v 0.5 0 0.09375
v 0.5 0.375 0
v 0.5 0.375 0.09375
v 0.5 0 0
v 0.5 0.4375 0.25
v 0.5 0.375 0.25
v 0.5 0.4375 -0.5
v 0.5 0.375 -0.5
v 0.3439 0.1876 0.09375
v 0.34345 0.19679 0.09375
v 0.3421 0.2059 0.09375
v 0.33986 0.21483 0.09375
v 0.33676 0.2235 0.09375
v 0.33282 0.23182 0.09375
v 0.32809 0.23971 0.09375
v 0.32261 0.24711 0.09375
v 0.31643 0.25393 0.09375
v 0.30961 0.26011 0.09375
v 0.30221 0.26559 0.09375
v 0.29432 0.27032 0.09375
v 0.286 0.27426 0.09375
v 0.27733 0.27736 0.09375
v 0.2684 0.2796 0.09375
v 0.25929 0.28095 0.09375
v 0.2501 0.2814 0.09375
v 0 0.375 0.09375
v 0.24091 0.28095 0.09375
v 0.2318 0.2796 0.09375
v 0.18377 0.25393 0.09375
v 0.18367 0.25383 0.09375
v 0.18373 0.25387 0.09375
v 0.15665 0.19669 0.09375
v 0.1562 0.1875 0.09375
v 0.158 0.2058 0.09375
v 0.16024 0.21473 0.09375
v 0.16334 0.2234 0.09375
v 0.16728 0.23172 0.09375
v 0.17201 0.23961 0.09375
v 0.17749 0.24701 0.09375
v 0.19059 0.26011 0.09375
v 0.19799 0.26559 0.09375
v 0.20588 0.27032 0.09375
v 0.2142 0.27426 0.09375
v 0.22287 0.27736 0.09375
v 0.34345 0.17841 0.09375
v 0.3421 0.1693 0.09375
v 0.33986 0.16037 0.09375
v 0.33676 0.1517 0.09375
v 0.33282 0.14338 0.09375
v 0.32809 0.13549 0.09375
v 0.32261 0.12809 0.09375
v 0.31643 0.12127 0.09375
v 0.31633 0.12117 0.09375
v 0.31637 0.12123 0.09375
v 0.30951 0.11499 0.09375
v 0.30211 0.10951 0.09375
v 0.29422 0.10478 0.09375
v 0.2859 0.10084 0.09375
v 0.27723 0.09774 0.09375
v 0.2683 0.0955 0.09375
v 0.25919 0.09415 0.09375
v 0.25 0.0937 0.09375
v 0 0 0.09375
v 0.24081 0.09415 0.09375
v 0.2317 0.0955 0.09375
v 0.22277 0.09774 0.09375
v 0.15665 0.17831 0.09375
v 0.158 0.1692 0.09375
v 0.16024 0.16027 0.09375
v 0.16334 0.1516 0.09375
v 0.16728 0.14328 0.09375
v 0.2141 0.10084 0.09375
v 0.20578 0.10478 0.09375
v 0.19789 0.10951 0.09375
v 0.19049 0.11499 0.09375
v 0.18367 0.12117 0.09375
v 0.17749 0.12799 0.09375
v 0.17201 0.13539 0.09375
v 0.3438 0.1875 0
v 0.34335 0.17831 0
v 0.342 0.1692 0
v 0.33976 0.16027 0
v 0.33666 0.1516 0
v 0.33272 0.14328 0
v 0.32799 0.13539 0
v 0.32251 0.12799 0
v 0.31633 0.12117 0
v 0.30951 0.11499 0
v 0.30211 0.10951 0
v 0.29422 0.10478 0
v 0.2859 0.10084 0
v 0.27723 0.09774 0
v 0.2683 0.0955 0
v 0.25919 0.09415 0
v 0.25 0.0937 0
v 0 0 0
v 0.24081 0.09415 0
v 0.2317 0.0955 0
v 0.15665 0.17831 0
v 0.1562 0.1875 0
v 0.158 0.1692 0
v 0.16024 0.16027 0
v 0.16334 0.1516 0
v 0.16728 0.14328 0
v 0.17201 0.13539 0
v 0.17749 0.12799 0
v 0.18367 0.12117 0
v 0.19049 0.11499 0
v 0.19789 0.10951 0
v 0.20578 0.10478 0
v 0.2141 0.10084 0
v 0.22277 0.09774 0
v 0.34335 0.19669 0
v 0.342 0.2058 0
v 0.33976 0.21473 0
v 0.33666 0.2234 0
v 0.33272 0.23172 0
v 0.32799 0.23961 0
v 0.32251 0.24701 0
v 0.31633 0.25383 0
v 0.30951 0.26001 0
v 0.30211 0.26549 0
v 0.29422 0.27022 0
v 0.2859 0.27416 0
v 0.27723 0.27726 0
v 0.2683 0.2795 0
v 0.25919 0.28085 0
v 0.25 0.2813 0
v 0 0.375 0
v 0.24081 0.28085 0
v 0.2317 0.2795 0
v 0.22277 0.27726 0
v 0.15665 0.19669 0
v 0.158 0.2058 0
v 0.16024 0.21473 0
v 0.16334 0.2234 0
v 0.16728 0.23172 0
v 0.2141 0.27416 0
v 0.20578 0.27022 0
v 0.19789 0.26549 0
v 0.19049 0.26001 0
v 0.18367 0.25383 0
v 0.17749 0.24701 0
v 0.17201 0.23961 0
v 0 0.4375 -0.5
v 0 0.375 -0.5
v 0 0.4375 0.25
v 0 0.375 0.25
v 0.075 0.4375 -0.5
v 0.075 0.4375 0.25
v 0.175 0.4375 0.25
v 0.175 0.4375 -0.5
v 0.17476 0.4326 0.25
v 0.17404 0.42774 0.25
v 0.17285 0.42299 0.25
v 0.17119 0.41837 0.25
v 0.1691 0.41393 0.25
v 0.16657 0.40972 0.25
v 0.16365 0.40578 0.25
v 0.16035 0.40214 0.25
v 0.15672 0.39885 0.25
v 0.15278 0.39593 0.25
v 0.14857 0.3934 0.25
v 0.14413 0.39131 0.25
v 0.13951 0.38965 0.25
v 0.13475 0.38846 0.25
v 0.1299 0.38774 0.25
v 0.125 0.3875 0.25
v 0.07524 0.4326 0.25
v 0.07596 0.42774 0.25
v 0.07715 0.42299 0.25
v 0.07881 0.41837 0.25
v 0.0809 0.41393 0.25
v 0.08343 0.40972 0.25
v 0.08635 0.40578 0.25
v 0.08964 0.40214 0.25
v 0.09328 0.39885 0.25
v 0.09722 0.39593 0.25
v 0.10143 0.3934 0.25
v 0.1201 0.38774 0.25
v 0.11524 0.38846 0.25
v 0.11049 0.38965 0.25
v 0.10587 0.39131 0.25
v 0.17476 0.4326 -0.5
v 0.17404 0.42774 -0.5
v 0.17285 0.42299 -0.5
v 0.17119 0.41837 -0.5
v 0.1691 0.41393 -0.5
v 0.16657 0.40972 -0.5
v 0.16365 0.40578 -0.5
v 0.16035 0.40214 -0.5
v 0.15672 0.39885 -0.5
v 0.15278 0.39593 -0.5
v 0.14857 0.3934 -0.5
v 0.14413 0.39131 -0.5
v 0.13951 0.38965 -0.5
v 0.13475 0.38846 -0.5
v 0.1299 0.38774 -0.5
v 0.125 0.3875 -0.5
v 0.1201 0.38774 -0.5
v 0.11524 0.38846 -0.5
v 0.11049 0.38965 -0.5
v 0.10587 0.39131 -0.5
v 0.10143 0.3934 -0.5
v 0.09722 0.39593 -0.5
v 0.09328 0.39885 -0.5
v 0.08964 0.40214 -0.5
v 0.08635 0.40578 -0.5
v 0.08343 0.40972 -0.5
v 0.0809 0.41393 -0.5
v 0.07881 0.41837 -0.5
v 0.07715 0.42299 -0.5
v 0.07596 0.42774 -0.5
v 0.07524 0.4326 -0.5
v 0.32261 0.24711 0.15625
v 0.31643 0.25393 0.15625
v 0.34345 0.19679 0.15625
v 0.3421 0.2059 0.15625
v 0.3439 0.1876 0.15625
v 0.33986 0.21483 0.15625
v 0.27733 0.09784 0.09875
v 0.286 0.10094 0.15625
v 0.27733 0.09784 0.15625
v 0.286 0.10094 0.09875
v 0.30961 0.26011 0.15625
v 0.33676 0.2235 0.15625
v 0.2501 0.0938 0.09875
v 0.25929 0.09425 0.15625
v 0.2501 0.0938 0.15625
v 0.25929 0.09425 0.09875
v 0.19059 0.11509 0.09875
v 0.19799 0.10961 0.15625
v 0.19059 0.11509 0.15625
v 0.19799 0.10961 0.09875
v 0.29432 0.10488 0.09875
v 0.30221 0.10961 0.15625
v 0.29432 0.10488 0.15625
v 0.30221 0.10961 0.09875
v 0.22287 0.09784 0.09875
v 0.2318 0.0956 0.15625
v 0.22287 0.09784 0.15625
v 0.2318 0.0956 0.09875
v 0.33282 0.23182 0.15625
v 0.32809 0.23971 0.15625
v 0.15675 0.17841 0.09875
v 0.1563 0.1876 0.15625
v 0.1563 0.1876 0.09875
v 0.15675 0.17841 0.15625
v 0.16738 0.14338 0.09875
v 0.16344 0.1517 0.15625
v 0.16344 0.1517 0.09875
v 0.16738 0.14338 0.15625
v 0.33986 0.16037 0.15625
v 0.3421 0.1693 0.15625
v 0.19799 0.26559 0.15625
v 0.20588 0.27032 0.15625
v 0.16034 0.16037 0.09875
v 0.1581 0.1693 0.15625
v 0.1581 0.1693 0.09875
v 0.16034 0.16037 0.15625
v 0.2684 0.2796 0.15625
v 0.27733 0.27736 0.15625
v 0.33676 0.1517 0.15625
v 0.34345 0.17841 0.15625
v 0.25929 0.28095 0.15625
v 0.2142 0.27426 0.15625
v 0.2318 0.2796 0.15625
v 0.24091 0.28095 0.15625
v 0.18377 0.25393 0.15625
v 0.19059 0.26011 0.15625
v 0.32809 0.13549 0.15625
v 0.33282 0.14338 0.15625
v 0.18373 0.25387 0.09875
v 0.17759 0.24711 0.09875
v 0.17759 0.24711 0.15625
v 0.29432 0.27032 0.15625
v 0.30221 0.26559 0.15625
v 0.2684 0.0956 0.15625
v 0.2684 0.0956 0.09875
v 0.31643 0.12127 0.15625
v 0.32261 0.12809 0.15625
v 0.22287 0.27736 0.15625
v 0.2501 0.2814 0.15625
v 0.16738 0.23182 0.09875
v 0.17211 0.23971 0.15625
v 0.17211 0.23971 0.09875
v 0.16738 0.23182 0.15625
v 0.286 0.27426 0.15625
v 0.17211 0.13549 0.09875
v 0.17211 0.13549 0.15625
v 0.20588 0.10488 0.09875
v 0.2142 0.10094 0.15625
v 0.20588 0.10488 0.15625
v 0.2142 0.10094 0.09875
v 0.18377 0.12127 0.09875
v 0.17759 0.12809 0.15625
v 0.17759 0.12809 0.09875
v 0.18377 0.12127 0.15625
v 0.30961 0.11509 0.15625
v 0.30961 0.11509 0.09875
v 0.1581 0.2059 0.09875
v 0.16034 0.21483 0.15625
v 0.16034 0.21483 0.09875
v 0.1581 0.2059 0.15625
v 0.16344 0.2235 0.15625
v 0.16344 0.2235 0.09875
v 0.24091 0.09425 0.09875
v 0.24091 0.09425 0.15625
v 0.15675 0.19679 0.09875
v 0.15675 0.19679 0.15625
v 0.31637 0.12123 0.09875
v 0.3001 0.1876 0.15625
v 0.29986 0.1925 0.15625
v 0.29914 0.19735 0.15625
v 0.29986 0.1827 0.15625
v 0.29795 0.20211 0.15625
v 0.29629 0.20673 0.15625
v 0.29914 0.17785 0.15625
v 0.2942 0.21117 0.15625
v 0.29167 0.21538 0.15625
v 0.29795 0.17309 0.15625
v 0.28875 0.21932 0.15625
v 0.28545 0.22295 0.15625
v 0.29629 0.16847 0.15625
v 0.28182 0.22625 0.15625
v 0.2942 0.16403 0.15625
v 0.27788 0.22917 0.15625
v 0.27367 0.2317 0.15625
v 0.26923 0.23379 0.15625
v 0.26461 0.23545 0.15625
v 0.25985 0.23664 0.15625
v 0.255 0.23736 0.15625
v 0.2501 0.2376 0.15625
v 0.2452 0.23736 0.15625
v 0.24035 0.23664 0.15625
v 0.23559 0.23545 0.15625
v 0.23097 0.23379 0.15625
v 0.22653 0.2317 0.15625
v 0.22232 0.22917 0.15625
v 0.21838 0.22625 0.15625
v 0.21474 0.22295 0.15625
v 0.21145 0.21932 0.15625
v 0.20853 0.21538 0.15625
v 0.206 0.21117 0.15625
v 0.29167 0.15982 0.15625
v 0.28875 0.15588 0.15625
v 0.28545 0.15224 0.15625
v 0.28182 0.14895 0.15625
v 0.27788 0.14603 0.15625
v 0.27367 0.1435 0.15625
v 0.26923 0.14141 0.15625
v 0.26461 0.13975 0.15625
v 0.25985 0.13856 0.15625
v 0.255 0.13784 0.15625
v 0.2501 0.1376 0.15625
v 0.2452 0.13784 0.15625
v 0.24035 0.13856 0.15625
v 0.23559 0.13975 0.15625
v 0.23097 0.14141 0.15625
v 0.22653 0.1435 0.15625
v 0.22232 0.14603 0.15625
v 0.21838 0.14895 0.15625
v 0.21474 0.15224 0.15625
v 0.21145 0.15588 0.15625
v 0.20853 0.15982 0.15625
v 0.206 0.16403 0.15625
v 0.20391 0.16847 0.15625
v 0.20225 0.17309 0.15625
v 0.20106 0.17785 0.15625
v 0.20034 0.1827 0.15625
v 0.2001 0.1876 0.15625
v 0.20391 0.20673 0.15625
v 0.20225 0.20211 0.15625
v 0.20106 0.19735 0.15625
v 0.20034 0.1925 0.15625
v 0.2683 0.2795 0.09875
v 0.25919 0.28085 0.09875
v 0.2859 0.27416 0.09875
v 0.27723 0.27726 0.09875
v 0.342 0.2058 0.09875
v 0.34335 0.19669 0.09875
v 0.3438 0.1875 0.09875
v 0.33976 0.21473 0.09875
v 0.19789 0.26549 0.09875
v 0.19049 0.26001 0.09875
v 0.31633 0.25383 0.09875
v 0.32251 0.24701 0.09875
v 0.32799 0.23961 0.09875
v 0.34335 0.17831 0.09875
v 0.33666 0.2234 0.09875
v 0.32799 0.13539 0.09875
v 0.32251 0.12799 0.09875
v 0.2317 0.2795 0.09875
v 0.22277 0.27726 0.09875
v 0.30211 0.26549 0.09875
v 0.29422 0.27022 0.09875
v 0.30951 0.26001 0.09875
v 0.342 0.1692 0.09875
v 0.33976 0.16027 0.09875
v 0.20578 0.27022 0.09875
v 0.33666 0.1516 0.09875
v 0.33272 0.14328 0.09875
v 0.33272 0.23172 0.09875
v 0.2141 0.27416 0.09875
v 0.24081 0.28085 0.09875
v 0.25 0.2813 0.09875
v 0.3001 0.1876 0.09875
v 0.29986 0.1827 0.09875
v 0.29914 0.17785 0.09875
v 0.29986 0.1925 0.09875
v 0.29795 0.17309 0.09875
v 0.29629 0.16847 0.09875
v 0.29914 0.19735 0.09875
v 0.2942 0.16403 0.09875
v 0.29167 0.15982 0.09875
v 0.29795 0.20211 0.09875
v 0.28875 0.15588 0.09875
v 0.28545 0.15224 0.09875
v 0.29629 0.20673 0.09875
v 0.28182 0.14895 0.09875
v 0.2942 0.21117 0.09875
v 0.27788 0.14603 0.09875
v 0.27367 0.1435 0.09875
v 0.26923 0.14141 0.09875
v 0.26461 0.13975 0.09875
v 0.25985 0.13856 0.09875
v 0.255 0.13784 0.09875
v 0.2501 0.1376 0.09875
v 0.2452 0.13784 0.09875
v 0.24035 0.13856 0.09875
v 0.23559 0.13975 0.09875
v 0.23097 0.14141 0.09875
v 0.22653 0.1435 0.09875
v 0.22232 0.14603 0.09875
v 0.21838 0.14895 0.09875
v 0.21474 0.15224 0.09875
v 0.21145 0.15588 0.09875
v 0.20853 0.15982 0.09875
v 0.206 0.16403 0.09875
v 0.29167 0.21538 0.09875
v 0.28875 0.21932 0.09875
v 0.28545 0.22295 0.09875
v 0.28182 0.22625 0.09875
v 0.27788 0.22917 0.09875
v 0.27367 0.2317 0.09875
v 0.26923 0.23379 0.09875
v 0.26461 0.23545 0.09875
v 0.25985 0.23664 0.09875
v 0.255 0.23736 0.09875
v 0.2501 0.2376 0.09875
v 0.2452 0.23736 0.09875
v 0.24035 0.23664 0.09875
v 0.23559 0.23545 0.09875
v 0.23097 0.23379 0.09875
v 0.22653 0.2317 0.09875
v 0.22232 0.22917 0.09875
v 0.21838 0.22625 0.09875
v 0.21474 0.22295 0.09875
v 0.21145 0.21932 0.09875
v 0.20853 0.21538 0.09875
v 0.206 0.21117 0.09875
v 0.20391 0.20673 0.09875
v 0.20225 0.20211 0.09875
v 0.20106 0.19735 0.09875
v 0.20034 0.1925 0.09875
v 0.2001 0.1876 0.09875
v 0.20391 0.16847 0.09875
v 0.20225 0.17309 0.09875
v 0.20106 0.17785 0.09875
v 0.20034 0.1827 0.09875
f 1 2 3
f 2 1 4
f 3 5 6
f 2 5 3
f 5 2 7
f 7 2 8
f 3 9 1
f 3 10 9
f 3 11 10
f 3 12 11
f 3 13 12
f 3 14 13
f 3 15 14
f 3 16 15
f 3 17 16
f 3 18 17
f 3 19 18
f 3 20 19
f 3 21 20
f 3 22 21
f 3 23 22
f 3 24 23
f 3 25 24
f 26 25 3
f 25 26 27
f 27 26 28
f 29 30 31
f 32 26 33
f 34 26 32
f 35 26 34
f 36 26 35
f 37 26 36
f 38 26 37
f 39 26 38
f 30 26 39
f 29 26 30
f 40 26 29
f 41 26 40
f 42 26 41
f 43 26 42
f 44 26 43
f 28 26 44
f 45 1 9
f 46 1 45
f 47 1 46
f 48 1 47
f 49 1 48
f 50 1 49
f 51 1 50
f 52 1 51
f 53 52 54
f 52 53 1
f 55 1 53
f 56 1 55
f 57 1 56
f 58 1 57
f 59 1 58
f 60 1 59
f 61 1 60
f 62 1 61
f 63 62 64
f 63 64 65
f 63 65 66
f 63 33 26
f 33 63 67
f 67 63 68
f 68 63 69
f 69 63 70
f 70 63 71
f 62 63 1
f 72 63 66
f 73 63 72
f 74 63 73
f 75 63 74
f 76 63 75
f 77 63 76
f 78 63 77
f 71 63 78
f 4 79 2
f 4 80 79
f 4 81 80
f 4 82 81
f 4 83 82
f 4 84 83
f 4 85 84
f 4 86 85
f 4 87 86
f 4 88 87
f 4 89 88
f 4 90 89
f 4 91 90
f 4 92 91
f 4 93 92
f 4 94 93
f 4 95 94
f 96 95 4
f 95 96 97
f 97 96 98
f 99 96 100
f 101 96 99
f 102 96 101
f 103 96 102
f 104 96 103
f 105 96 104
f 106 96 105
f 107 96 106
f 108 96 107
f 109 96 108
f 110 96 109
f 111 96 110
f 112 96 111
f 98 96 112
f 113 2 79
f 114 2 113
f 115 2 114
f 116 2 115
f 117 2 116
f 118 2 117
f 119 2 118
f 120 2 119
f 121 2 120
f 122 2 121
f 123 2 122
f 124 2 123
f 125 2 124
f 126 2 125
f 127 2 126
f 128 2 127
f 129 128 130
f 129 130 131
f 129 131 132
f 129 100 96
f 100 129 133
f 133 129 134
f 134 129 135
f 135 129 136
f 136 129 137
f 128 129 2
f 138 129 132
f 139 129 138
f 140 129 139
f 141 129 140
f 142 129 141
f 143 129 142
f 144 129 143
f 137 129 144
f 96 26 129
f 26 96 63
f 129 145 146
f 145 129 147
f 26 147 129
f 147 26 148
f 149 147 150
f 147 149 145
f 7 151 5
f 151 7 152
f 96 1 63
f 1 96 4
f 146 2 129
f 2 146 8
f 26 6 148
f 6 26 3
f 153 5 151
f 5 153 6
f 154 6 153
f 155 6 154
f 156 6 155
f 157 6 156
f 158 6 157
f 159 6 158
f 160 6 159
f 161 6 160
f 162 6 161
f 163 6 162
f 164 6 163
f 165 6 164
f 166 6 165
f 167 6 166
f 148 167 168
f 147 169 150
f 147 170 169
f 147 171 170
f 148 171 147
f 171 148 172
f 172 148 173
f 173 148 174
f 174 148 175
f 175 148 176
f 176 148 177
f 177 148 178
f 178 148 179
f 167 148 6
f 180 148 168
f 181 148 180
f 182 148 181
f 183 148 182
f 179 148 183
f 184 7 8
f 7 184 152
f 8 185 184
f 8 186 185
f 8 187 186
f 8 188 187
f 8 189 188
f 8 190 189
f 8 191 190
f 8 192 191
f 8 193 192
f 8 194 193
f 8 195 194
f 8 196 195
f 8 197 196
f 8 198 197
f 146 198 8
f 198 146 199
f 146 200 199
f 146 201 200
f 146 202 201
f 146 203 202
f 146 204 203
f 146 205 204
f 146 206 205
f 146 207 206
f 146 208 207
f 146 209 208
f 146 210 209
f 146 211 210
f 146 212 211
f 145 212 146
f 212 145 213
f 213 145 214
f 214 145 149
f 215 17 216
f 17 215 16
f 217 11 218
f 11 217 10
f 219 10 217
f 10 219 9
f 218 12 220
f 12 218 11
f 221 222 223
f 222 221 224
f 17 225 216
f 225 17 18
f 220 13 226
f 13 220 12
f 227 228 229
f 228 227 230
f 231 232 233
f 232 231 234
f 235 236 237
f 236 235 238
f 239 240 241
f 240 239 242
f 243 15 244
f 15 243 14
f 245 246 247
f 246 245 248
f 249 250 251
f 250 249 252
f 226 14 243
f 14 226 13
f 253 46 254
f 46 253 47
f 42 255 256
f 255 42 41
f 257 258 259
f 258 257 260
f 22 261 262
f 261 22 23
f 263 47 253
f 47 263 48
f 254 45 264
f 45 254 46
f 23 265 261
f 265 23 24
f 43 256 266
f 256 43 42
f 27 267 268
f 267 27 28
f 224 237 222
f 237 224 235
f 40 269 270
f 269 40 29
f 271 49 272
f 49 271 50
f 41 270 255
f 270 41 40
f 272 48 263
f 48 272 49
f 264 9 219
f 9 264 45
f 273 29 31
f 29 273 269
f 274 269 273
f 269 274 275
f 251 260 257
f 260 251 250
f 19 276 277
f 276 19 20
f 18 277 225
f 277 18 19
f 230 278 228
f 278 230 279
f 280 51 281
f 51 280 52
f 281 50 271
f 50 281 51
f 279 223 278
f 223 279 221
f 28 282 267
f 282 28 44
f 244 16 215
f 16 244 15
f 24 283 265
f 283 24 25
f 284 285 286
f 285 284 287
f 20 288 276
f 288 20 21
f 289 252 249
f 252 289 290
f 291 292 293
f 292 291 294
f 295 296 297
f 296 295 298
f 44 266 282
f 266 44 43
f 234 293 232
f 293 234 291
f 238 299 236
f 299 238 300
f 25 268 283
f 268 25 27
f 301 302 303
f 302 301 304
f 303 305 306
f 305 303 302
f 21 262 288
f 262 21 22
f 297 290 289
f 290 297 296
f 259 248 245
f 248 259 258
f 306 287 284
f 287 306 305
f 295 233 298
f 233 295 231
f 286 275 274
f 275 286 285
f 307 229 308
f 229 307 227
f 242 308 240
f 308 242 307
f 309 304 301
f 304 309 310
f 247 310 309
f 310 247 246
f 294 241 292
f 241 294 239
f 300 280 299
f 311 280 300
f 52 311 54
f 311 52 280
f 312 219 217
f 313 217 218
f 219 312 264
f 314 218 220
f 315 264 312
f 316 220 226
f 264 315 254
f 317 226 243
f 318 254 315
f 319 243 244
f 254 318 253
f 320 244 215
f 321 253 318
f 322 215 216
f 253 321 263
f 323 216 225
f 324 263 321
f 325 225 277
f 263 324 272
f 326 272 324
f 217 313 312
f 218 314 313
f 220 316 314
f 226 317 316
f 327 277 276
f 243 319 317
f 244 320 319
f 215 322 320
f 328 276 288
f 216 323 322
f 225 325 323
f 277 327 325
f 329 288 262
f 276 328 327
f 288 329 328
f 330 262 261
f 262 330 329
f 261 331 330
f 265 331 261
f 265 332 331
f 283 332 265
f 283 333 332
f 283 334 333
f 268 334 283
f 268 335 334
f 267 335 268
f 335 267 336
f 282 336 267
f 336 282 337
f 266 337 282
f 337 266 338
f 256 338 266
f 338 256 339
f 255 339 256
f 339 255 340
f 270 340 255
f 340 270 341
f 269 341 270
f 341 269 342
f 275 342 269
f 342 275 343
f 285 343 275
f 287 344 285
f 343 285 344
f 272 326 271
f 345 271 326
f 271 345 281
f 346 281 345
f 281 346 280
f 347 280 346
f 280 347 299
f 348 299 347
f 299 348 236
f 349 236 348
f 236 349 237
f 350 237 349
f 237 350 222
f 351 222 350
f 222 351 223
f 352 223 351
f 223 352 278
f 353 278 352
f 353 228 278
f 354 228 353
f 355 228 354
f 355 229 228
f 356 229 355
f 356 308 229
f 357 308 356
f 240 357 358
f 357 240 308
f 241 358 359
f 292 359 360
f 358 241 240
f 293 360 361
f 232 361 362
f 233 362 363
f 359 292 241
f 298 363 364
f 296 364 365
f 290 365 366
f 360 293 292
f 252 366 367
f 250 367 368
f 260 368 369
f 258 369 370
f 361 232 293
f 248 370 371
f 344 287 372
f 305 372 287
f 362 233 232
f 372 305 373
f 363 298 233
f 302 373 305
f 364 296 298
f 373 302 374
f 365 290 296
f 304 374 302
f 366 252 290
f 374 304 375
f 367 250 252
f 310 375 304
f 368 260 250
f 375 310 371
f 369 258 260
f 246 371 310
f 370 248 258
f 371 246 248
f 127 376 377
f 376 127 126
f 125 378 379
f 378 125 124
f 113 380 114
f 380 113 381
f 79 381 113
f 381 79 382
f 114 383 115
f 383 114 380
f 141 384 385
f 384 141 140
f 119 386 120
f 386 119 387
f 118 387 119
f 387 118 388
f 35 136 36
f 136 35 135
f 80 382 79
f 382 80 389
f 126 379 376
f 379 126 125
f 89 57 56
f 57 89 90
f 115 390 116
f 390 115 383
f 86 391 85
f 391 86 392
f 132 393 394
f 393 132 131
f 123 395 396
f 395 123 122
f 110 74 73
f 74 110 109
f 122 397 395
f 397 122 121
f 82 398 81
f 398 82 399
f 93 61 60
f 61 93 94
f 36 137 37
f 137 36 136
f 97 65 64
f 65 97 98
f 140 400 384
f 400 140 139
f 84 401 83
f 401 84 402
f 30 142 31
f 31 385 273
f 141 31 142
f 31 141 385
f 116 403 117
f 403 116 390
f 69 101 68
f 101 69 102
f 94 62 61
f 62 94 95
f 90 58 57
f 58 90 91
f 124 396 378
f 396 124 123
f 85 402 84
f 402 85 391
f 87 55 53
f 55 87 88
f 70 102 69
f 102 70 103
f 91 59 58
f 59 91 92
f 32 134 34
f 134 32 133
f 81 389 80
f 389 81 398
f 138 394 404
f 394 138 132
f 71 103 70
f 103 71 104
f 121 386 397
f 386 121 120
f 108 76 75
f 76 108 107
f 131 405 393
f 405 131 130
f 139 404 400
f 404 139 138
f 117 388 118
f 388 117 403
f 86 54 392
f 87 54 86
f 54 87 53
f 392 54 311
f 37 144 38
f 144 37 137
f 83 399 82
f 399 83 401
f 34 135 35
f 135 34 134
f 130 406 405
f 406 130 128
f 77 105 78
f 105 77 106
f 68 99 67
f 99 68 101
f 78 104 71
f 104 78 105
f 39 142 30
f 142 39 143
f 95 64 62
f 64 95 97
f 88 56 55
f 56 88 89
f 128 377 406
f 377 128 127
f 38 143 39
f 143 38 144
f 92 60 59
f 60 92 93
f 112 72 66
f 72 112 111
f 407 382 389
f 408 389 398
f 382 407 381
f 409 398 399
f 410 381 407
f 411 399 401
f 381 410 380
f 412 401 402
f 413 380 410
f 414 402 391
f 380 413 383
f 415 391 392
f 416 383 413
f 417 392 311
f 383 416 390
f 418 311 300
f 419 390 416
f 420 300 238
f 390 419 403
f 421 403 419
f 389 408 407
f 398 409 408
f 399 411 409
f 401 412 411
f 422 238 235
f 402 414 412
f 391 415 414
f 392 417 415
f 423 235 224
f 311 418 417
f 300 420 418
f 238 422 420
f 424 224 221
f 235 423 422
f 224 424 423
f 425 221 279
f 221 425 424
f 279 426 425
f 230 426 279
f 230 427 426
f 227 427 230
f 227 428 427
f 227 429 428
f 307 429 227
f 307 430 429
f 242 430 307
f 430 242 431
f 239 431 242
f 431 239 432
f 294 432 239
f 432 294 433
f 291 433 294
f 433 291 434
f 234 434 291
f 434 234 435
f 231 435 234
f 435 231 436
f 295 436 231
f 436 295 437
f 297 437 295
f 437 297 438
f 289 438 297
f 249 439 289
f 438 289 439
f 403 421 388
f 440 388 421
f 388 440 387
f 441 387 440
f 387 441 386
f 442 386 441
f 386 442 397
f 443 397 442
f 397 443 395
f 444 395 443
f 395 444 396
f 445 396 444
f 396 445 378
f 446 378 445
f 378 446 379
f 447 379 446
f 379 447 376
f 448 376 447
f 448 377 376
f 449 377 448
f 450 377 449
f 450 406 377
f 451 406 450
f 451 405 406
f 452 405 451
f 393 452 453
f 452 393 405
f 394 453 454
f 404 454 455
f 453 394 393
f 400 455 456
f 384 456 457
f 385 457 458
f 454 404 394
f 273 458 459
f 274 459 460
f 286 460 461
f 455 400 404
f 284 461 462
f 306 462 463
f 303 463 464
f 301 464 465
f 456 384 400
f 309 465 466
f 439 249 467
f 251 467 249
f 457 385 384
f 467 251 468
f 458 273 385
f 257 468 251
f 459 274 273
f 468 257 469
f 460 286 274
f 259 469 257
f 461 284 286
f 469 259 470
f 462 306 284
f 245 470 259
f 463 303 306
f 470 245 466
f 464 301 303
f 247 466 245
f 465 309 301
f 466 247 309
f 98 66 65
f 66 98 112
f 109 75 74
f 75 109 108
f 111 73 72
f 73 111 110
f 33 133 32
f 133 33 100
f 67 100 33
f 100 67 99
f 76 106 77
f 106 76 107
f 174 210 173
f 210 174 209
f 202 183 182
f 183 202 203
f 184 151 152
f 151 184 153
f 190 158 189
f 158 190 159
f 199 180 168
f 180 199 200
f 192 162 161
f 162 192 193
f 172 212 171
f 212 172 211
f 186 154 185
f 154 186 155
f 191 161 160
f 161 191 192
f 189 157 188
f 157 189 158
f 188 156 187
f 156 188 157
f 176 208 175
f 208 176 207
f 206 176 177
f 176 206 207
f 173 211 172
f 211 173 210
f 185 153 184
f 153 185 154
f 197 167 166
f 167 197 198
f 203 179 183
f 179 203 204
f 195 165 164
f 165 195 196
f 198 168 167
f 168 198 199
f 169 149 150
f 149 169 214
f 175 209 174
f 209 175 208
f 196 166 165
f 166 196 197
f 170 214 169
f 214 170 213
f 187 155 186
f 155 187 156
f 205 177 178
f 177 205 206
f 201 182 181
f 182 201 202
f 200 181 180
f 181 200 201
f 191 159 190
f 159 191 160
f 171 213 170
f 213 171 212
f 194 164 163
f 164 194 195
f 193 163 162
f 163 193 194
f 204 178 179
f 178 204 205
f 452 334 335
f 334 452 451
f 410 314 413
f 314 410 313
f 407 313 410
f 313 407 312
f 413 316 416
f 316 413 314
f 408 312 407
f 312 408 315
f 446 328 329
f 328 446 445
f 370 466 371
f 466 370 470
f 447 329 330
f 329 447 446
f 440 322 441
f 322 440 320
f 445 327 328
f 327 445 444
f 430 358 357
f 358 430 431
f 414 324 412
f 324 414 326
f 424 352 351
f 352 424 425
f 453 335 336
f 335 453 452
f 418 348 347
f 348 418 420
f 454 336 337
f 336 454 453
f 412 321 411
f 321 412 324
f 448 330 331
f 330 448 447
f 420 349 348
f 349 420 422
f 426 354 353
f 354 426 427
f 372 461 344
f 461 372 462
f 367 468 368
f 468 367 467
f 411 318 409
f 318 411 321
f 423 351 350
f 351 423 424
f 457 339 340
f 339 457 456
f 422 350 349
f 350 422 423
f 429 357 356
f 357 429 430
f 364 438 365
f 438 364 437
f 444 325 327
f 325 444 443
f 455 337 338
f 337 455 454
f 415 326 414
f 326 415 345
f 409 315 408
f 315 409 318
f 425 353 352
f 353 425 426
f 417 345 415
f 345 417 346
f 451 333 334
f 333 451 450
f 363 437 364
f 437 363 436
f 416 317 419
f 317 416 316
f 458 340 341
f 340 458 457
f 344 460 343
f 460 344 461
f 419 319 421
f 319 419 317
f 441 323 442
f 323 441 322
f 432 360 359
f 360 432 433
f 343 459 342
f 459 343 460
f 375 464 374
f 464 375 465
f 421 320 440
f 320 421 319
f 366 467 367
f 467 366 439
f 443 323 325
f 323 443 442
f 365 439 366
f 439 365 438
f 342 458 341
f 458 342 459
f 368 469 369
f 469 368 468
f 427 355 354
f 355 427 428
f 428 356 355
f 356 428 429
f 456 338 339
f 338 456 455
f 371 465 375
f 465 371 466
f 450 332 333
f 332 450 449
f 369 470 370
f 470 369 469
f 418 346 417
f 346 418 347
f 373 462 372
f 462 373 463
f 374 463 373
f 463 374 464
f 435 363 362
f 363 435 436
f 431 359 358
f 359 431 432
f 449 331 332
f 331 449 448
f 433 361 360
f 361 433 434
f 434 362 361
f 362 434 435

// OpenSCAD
// Global Resolution Setting
$fn = 64;

// ==============================
// Parameter Definitions
// ==============================
// Main Base Dimensions
base_length = 0.5;      // Left-right (X) dimension
base_width = 0.4375;    // Front-back (Y) dimension
base_height = 0.09375;  // Vertical (Z) thickness

// Base Void Parameters
base_hole_x = 0.25;     // X position from left edge
base_hole_y = 0.1875;   // Y position from front edge
base_hole_r = 0.0938;   // Radius of through hole

// Back Strip Shared Parameters
back_strip_width = 0.0625;
back_strip_front_offset = 0.375; // Y start position from front edge

// Lower Underside Back Strip
lower_strip_z_min = -0.25;
lower_strip_z_max = 0; // Aligned to base underside

// Tall Back Edge Strip
tall_strip_z_min = -0.5;
tall_strip_z_max = 0.25;
tall_strip_hole_x = 0.125;
tall_strip_hole_y = 0.4375;
tall_strip_hole_r = 0.05;

// Upper Annular Collar Parameters
collar_x = 0.2501;
collar_y = 0.1876;
collar_outer_r = 0.0938;
collar_inner_r = 0.05;
collar_height = 0.0625;

// ==============================
// Main Model Construction
// ==============================
difference() {
    // Union of all solid components
    union() {
        // Main base plate
        cube([base_length, base_width, base_height]);

        // Lower underside back strip
        translate([0, back_strip_front_offset, lower_strip_z_min])
        cube([base_length, back_strip_width, lower_strip_z_max - lower_strip_z_min]);

        // Tall back edge strip
        translate([0, back_strip_front_offset, tall_strip_z_min])
        cube([base_length, back_strip_width, tall_strip_z_max - tall_strip_z_min]);

        // Upper annular collar outer wall
        translate([collar_x, collar_y, base_height])
        cylinder(h=collar_height, r=collar_outer_r);
    }

    // All void/hole cuts
    // Base plate through hole
    translate([base_hole_x, base_hole_y, -0.005])
    cylinder(h=base_height + 0.01, r=base_hole_r);

    // Tall back strip through hole
    translate([tall_strip_hole_x, tall_strip_hole_y, tall_strip_z_min - 0.01])
    cylinder(h=tall_strip_z_max - tall_strip_z_min + 0.02, r=tall_strip_hole_r);

    // Collar inner hole
    translate([collar_x, collar_y, base_height - 0.005])
    cylinder(h=collar_height + 0.01, r=collar_inner_r);
}
